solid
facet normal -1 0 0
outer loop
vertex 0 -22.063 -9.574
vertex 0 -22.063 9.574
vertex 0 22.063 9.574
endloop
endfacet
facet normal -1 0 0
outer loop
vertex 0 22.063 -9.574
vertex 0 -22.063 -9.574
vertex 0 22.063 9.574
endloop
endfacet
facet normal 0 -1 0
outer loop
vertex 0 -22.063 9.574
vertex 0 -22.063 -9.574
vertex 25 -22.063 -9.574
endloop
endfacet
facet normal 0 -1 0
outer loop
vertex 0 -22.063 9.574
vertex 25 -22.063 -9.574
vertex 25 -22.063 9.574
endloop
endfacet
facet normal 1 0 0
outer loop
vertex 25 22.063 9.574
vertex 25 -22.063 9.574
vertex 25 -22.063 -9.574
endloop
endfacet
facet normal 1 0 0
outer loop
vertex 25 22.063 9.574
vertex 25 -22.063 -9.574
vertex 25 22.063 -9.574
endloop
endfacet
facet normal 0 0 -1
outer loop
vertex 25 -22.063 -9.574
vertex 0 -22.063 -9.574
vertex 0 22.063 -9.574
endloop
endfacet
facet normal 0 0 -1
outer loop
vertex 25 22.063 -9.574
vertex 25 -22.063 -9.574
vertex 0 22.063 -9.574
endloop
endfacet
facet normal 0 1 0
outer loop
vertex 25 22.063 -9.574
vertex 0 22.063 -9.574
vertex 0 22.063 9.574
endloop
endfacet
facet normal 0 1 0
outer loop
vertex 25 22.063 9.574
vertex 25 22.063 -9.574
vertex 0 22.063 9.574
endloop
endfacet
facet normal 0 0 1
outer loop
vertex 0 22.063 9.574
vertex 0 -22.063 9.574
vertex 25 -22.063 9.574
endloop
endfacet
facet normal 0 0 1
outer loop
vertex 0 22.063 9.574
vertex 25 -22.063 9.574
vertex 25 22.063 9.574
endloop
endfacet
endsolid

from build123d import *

# Parameters (mm, degrees)
F0_W     = 75.775846839
F0_H     = 118.2782948017
F1_DEPTH = 62.6077670604
F3_W     = 44.1254228354
F3_H     = 19.1485136747
F4_DEPTH = 25


with BuildPart() as f1:
    # F0 (on Top) → F1 (new body)
    with BuildSketch(Plane.XY):
        Rectangle(F0_W, F0_H)
    extrude(amount=F1_DEPTH)


with BuildPart() as f4:
    # F3 (on Right) → F4 (new body)
    with BuildSketch(Plane.YZ):
        Rectangle(F3_W, F3_H)
    extrude(amount=F4_DEPTH)


solid = f4.part
